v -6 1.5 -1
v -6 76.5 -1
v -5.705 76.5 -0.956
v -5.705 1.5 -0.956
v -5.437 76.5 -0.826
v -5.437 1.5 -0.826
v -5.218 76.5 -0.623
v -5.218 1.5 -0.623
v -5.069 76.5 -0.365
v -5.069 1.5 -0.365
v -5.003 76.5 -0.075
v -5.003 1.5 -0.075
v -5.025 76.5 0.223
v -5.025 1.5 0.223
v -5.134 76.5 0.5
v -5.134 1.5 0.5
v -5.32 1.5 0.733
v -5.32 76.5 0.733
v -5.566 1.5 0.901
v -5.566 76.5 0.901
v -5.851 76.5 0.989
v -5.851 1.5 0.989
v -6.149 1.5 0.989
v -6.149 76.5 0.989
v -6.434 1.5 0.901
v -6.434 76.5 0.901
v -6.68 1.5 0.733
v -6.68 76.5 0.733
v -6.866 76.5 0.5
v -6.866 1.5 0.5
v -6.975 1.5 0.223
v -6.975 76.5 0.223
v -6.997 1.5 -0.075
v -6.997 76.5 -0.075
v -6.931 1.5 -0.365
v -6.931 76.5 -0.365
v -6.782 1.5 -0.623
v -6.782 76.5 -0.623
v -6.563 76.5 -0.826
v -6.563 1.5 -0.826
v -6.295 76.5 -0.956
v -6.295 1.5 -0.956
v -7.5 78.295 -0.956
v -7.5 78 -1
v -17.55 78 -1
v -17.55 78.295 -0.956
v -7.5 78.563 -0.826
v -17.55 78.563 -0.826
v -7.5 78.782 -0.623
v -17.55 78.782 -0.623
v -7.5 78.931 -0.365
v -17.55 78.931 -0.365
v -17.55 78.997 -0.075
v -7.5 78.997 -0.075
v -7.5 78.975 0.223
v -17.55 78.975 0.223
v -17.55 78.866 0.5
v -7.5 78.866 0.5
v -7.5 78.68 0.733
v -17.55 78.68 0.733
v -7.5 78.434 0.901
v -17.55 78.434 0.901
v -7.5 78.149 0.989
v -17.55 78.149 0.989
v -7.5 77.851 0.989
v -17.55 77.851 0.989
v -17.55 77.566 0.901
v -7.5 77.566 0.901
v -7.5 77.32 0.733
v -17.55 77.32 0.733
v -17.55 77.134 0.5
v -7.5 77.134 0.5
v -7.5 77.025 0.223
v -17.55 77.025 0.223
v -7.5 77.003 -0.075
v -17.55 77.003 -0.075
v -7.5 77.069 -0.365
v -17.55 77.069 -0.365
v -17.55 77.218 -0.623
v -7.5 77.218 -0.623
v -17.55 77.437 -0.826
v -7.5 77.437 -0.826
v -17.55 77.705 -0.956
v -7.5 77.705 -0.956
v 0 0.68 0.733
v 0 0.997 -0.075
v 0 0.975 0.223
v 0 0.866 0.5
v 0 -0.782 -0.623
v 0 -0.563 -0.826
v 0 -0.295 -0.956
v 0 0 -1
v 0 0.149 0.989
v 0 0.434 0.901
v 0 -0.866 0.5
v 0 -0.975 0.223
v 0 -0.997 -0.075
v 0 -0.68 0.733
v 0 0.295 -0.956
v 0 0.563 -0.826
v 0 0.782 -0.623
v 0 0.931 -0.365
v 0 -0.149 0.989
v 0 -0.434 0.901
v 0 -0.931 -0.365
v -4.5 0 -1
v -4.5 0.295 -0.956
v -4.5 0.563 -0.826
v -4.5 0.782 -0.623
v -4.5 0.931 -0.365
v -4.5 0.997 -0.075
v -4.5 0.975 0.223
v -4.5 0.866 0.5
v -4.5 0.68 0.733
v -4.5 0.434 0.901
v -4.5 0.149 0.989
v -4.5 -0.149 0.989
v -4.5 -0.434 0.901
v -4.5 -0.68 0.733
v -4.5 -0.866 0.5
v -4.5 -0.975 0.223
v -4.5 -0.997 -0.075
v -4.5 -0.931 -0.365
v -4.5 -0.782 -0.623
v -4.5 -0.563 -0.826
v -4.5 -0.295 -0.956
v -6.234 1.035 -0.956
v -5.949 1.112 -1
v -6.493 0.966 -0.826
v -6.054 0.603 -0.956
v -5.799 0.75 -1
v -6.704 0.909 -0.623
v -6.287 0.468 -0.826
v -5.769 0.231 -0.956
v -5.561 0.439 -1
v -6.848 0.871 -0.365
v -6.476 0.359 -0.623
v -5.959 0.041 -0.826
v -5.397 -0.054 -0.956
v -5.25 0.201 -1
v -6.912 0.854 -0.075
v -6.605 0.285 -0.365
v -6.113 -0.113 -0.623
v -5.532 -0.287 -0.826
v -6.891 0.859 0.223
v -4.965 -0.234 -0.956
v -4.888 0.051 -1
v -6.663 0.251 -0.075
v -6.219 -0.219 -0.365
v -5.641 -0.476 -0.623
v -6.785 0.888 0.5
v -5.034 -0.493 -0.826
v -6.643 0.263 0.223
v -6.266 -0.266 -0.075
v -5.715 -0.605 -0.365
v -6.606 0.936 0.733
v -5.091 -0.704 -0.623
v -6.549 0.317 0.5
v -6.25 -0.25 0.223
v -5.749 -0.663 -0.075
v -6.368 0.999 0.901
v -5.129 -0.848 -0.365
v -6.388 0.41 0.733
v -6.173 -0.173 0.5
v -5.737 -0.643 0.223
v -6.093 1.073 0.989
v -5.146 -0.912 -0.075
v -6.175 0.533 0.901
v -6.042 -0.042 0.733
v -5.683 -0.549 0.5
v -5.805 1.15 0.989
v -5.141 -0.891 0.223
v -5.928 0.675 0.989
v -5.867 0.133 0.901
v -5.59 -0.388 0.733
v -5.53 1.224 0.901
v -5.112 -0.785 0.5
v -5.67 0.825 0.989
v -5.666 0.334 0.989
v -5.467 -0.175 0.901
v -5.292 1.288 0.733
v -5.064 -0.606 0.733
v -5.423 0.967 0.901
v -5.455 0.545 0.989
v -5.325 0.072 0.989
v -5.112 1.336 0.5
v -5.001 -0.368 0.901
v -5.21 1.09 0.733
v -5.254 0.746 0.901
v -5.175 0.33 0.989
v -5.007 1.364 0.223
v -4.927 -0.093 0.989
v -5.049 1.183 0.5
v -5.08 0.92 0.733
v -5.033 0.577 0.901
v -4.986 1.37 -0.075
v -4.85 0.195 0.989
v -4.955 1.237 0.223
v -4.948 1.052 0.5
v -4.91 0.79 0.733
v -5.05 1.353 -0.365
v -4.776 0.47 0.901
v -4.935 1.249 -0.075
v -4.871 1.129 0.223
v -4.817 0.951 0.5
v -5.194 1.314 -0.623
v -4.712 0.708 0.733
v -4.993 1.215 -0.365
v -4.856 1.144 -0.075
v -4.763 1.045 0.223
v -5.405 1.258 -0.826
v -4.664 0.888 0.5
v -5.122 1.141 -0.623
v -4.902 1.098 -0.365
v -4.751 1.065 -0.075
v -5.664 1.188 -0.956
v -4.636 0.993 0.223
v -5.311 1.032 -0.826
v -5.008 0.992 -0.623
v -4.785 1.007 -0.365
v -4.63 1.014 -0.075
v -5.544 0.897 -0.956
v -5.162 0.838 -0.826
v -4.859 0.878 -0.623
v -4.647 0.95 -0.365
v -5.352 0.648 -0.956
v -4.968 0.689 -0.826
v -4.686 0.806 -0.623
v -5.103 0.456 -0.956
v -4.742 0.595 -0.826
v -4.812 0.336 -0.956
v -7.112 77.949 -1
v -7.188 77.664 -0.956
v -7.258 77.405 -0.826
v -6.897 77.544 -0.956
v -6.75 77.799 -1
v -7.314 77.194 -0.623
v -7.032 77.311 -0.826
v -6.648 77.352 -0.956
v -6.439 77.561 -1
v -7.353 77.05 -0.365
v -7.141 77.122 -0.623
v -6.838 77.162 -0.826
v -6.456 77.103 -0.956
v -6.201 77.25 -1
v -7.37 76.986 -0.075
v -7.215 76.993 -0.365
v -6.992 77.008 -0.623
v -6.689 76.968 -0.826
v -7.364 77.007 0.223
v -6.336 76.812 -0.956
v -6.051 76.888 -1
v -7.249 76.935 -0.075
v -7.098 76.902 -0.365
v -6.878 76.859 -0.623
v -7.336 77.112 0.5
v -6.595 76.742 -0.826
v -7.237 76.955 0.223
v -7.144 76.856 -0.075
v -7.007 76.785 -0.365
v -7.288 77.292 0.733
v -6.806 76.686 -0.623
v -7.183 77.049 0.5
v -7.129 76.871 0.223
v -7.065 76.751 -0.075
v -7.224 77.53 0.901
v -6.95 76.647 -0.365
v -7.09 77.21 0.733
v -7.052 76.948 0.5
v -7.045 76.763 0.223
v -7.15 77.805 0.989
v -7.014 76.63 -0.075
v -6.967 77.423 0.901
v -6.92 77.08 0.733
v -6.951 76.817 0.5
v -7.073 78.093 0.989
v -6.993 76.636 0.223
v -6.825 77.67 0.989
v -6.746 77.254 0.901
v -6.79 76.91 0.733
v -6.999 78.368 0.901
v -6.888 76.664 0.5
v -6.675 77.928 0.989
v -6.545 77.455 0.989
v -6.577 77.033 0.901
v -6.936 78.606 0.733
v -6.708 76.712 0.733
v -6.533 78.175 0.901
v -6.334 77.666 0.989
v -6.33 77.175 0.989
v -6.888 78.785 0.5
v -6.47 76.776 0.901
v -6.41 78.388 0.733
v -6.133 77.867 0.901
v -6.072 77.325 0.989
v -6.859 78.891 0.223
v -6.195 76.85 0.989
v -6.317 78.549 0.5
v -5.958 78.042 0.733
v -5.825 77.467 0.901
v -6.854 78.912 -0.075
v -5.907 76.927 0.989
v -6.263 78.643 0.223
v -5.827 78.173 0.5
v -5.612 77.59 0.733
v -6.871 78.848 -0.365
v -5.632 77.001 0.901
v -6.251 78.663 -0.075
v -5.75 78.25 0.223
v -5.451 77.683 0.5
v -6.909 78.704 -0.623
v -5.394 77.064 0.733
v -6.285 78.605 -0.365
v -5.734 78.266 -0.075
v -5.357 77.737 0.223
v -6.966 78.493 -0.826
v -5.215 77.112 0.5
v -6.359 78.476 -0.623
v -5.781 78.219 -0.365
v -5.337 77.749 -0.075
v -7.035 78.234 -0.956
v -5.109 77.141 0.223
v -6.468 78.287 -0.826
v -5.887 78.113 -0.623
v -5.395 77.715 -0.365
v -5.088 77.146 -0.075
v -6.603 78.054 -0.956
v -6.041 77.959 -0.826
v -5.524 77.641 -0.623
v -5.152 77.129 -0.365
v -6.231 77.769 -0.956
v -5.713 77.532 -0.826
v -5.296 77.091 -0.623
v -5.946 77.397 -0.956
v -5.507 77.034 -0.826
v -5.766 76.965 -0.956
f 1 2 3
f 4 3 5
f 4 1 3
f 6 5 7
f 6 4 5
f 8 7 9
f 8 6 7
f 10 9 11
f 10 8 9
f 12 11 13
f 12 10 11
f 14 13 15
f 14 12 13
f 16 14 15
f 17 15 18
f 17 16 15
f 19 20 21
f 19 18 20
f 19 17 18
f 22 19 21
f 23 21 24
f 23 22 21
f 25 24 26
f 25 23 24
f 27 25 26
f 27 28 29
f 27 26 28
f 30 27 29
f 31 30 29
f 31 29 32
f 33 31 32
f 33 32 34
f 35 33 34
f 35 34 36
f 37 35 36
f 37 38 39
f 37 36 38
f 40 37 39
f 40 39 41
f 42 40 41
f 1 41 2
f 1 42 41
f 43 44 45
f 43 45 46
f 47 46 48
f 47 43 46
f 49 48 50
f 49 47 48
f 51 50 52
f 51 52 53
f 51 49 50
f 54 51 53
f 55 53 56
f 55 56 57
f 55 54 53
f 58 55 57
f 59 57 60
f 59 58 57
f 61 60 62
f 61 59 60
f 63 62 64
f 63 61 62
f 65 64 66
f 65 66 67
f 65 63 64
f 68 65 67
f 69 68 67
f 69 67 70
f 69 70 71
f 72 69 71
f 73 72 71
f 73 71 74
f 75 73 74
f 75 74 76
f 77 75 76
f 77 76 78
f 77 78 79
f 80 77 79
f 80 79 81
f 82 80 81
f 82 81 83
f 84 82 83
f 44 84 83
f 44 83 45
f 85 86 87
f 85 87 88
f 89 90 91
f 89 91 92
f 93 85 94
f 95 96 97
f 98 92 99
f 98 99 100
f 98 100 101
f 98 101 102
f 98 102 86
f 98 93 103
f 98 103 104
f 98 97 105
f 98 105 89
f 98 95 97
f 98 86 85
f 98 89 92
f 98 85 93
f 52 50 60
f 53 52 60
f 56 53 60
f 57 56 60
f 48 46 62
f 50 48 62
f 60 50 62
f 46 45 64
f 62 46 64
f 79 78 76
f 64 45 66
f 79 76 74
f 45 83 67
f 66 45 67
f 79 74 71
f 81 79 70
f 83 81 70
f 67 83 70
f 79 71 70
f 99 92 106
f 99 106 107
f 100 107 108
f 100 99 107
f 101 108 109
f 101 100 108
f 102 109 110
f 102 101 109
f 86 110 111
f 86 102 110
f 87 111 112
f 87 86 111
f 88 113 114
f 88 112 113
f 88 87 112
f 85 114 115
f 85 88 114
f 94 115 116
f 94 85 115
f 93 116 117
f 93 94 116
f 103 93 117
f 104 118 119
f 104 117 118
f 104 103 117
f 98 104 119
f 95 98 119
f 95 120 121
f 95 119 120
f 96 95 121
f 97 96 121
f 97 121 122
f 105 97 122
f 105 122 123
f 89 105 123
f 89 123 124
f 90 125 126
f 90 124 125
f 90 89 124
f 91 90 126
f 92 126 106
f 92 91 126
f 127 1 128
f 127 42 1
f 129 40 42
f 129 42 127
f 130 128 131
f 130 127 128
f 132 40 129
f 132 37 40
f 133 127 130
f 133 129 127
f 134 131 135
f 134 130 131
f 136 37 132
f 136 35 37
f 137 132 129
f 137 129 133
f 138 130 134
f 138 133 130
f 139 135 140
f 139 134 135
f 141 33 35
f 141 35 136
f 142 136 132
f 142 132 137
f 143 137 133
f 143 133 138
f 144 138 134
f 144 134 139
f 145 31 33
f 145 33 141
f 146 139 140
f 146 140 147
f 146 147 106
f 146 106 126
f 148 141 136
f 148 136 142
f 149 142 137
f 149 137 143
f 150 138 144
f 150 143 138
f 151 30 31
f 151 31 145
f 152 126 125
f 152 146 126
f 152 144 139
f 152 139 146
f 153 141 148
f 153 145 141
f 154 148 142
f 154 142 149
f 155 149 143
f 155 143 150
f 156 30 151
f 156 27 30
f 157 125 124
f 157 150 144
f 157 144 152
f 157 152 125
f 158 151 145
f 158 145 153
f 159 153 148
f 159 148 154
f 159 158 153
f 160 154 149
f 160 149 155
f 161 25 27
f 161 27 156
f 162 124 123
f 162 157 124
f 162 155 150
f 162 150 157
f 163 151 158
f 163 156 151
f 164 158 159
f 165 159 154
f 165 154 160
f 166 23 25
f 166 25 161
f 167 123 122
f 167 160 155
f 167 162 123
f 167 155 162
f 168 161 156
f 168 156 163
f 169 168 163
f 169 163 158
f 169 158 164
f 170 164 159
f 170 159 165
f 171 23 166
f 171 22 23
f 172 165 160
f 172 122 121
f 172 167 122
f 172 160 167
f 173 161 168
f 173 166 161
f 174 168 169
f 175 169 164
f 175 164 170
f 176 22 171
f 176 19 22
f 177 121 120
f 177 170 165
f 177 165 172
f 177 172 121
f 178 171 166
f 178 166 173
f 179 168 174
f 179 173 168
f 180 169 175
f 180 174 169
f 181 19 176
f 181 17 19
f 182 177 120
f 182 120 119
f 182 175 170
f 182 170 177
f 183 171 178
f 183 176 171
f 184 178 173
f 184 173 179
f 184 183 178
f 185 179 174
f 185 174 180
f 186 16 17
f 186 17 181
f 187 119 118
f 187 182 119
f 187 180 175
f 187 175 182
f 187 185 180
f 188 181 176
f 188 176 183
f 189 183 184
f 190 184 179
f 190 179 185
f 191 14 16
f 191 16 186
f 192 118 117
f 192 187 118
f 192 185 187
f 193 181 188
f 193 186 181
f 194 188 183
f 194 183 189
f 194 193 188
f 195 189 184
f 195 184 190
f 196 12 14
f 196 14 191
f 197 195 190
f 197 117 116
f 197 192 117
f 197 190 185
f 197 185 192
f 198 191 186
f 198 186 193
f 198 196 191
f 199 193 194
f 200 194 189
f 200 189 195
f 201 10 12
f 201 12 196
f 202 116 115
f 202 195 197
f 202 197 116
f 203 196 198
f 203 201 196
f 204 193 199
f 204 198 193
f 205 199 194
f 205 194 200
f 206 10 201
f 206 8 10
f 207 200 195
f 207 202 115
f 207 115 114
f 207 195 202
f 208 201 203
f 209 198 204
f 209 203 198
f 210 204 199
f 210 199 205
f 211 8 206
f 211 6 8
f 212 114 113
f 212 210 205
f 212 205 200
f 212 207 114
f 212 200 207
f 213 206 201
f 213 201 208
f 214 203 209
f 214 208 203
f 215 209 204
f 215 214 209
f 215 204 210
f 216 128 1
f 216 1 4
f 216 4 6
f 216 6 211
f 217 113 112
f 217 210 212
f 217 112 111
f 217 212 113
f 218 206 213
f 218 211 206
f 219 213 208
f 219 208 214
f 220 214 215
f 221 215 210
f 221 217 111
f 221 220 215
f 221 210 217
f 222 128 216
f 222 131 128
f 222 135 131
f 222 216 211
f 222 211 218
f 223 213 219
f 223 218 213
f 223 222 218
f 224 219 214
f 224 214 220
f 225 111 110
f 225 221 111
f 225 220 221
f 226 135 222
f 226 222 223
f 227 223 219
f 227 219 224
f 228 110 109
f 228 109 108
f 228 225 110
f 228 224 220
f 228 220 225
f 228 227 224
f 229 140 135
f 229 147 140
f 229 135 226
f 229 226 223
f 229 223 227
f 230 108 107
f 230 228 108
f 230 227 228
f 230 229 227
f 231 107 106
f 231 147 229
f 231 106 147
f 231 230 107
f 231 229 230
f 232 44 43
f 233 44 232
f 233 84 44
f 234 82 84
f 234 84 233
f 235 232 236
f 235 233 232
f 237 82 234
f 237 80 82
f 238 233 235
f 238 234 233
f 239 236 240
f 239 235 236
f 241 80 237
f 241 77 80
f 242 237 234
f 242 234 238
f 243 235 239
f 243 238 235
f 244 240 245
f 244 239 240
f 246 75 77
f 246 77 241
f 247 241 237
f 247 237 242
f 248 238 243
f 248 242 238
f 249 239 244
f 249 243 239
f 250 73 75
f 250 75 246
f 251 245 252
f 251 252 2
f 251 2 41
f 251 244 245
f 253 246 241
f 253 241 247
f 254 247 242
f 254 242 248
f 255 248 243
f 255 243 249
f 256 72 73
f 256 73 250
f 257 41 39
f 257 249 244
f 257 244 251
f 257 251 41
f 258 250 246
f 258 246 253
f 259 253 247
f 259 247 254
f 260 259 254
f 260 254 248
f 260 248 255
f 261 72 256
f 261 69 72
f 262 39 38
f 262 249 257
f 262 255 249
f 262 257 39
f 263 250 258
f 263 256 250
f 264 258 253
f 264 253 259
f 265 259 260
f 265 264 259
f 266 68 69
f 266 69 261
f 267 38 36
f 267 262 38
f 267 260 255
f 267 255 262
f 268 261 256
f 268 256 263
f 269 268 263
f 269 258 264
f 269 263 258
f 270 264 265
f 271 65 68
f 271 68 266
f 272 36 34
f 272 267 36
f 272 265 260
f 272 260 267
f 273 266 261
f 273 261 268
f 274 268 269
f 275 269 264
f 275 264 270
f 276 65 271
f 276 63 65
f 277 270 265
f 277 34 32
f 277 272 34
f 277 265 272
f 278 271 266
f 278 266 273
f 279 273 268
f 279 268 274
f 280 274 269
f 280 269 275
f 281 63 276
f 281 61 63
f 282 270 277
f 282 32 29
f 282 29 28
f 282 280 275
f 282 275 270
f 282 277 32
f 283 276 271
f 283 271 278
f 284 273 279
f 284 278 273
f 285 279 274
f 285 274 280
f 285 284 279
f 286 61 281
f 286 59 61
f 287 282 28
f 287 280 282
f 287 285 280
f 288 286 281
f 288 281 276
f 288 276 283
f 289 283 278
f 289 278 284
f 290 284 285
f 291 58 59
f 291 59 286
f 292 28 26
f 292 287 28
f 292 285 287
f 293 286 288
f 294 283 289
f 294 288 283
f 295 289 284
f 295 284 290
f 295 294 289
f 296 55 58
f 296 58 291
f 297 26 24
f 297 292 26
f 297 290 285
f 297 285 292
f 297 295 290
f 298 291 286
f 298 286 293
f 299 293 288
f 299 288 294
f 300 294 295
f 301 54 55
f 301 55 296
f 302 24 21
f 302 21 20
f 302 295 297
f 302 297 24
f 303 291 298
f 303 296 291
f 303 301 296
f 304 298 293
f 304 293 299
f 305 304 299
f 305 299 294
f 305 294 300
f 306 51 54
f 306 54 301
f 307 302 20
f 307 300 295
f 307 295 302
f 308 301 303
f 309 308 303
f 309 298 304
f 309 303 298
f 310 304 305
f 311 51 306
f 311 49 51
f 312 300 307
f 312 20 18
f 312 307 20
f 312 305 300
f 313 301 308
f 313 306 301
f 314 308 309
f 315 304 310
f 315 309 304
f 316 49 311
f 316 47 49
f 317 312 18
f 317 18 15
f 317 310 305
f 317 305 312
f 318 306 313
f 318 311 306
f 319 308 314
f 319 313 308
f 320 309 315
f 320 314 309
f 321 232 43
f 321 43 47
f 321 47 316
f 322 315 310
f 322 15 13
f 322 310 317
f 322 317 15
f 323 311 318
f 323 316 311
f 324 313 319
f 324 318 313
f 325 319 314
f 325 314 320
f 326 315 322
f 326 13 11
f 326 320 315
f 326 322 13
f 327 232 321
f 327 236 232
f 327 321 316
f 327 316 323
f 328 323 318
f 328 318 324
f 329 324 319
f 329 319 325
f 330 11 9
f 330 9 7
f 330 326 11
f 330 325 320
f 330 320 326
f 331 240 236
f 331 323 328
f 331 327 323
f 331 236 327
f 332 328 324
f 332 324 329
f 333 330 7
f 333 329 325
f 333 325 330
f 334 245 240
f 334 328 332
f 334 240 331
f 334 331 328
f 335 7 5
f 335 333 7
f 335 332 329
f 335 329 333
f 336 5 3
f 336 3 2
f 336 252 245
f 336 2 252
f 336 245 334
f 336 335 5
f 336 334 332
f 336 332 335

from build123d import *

# Parameters (mm, degrees)
SKETCH2_R = 1


with BuildPart() as part:
    # Sweep1: sweep along a path in Sketch1
    with BuildLine(Plane.XY) as sweep1_path:
        Line((-17.55, 78), (-7.5, 78))
        ThreePointArc((-7.5, 78), (-6.439339828, 77.560660172), (-6, 76.5))
        Line((-6, 76.5), (-6, 1.5))
        ThreePointArc((-6, 1.5), (-5.560660172, 0.439339828), (-4.5, 0))
        Line((-4.5, 0), (-3.5, 0))
        Line((-3.5, 0), (0, 0))
    # Sketch2 → Sweep1 (sweep)
    with BuildSketch(Plane(origin=(0, 0, 0), x_dir=(0, 0, -1), z_dir=(1, 0, 0))):
        Circle(SKETCH2_R)
    sweep(path=sweep1_path.line)


solid = part.part
